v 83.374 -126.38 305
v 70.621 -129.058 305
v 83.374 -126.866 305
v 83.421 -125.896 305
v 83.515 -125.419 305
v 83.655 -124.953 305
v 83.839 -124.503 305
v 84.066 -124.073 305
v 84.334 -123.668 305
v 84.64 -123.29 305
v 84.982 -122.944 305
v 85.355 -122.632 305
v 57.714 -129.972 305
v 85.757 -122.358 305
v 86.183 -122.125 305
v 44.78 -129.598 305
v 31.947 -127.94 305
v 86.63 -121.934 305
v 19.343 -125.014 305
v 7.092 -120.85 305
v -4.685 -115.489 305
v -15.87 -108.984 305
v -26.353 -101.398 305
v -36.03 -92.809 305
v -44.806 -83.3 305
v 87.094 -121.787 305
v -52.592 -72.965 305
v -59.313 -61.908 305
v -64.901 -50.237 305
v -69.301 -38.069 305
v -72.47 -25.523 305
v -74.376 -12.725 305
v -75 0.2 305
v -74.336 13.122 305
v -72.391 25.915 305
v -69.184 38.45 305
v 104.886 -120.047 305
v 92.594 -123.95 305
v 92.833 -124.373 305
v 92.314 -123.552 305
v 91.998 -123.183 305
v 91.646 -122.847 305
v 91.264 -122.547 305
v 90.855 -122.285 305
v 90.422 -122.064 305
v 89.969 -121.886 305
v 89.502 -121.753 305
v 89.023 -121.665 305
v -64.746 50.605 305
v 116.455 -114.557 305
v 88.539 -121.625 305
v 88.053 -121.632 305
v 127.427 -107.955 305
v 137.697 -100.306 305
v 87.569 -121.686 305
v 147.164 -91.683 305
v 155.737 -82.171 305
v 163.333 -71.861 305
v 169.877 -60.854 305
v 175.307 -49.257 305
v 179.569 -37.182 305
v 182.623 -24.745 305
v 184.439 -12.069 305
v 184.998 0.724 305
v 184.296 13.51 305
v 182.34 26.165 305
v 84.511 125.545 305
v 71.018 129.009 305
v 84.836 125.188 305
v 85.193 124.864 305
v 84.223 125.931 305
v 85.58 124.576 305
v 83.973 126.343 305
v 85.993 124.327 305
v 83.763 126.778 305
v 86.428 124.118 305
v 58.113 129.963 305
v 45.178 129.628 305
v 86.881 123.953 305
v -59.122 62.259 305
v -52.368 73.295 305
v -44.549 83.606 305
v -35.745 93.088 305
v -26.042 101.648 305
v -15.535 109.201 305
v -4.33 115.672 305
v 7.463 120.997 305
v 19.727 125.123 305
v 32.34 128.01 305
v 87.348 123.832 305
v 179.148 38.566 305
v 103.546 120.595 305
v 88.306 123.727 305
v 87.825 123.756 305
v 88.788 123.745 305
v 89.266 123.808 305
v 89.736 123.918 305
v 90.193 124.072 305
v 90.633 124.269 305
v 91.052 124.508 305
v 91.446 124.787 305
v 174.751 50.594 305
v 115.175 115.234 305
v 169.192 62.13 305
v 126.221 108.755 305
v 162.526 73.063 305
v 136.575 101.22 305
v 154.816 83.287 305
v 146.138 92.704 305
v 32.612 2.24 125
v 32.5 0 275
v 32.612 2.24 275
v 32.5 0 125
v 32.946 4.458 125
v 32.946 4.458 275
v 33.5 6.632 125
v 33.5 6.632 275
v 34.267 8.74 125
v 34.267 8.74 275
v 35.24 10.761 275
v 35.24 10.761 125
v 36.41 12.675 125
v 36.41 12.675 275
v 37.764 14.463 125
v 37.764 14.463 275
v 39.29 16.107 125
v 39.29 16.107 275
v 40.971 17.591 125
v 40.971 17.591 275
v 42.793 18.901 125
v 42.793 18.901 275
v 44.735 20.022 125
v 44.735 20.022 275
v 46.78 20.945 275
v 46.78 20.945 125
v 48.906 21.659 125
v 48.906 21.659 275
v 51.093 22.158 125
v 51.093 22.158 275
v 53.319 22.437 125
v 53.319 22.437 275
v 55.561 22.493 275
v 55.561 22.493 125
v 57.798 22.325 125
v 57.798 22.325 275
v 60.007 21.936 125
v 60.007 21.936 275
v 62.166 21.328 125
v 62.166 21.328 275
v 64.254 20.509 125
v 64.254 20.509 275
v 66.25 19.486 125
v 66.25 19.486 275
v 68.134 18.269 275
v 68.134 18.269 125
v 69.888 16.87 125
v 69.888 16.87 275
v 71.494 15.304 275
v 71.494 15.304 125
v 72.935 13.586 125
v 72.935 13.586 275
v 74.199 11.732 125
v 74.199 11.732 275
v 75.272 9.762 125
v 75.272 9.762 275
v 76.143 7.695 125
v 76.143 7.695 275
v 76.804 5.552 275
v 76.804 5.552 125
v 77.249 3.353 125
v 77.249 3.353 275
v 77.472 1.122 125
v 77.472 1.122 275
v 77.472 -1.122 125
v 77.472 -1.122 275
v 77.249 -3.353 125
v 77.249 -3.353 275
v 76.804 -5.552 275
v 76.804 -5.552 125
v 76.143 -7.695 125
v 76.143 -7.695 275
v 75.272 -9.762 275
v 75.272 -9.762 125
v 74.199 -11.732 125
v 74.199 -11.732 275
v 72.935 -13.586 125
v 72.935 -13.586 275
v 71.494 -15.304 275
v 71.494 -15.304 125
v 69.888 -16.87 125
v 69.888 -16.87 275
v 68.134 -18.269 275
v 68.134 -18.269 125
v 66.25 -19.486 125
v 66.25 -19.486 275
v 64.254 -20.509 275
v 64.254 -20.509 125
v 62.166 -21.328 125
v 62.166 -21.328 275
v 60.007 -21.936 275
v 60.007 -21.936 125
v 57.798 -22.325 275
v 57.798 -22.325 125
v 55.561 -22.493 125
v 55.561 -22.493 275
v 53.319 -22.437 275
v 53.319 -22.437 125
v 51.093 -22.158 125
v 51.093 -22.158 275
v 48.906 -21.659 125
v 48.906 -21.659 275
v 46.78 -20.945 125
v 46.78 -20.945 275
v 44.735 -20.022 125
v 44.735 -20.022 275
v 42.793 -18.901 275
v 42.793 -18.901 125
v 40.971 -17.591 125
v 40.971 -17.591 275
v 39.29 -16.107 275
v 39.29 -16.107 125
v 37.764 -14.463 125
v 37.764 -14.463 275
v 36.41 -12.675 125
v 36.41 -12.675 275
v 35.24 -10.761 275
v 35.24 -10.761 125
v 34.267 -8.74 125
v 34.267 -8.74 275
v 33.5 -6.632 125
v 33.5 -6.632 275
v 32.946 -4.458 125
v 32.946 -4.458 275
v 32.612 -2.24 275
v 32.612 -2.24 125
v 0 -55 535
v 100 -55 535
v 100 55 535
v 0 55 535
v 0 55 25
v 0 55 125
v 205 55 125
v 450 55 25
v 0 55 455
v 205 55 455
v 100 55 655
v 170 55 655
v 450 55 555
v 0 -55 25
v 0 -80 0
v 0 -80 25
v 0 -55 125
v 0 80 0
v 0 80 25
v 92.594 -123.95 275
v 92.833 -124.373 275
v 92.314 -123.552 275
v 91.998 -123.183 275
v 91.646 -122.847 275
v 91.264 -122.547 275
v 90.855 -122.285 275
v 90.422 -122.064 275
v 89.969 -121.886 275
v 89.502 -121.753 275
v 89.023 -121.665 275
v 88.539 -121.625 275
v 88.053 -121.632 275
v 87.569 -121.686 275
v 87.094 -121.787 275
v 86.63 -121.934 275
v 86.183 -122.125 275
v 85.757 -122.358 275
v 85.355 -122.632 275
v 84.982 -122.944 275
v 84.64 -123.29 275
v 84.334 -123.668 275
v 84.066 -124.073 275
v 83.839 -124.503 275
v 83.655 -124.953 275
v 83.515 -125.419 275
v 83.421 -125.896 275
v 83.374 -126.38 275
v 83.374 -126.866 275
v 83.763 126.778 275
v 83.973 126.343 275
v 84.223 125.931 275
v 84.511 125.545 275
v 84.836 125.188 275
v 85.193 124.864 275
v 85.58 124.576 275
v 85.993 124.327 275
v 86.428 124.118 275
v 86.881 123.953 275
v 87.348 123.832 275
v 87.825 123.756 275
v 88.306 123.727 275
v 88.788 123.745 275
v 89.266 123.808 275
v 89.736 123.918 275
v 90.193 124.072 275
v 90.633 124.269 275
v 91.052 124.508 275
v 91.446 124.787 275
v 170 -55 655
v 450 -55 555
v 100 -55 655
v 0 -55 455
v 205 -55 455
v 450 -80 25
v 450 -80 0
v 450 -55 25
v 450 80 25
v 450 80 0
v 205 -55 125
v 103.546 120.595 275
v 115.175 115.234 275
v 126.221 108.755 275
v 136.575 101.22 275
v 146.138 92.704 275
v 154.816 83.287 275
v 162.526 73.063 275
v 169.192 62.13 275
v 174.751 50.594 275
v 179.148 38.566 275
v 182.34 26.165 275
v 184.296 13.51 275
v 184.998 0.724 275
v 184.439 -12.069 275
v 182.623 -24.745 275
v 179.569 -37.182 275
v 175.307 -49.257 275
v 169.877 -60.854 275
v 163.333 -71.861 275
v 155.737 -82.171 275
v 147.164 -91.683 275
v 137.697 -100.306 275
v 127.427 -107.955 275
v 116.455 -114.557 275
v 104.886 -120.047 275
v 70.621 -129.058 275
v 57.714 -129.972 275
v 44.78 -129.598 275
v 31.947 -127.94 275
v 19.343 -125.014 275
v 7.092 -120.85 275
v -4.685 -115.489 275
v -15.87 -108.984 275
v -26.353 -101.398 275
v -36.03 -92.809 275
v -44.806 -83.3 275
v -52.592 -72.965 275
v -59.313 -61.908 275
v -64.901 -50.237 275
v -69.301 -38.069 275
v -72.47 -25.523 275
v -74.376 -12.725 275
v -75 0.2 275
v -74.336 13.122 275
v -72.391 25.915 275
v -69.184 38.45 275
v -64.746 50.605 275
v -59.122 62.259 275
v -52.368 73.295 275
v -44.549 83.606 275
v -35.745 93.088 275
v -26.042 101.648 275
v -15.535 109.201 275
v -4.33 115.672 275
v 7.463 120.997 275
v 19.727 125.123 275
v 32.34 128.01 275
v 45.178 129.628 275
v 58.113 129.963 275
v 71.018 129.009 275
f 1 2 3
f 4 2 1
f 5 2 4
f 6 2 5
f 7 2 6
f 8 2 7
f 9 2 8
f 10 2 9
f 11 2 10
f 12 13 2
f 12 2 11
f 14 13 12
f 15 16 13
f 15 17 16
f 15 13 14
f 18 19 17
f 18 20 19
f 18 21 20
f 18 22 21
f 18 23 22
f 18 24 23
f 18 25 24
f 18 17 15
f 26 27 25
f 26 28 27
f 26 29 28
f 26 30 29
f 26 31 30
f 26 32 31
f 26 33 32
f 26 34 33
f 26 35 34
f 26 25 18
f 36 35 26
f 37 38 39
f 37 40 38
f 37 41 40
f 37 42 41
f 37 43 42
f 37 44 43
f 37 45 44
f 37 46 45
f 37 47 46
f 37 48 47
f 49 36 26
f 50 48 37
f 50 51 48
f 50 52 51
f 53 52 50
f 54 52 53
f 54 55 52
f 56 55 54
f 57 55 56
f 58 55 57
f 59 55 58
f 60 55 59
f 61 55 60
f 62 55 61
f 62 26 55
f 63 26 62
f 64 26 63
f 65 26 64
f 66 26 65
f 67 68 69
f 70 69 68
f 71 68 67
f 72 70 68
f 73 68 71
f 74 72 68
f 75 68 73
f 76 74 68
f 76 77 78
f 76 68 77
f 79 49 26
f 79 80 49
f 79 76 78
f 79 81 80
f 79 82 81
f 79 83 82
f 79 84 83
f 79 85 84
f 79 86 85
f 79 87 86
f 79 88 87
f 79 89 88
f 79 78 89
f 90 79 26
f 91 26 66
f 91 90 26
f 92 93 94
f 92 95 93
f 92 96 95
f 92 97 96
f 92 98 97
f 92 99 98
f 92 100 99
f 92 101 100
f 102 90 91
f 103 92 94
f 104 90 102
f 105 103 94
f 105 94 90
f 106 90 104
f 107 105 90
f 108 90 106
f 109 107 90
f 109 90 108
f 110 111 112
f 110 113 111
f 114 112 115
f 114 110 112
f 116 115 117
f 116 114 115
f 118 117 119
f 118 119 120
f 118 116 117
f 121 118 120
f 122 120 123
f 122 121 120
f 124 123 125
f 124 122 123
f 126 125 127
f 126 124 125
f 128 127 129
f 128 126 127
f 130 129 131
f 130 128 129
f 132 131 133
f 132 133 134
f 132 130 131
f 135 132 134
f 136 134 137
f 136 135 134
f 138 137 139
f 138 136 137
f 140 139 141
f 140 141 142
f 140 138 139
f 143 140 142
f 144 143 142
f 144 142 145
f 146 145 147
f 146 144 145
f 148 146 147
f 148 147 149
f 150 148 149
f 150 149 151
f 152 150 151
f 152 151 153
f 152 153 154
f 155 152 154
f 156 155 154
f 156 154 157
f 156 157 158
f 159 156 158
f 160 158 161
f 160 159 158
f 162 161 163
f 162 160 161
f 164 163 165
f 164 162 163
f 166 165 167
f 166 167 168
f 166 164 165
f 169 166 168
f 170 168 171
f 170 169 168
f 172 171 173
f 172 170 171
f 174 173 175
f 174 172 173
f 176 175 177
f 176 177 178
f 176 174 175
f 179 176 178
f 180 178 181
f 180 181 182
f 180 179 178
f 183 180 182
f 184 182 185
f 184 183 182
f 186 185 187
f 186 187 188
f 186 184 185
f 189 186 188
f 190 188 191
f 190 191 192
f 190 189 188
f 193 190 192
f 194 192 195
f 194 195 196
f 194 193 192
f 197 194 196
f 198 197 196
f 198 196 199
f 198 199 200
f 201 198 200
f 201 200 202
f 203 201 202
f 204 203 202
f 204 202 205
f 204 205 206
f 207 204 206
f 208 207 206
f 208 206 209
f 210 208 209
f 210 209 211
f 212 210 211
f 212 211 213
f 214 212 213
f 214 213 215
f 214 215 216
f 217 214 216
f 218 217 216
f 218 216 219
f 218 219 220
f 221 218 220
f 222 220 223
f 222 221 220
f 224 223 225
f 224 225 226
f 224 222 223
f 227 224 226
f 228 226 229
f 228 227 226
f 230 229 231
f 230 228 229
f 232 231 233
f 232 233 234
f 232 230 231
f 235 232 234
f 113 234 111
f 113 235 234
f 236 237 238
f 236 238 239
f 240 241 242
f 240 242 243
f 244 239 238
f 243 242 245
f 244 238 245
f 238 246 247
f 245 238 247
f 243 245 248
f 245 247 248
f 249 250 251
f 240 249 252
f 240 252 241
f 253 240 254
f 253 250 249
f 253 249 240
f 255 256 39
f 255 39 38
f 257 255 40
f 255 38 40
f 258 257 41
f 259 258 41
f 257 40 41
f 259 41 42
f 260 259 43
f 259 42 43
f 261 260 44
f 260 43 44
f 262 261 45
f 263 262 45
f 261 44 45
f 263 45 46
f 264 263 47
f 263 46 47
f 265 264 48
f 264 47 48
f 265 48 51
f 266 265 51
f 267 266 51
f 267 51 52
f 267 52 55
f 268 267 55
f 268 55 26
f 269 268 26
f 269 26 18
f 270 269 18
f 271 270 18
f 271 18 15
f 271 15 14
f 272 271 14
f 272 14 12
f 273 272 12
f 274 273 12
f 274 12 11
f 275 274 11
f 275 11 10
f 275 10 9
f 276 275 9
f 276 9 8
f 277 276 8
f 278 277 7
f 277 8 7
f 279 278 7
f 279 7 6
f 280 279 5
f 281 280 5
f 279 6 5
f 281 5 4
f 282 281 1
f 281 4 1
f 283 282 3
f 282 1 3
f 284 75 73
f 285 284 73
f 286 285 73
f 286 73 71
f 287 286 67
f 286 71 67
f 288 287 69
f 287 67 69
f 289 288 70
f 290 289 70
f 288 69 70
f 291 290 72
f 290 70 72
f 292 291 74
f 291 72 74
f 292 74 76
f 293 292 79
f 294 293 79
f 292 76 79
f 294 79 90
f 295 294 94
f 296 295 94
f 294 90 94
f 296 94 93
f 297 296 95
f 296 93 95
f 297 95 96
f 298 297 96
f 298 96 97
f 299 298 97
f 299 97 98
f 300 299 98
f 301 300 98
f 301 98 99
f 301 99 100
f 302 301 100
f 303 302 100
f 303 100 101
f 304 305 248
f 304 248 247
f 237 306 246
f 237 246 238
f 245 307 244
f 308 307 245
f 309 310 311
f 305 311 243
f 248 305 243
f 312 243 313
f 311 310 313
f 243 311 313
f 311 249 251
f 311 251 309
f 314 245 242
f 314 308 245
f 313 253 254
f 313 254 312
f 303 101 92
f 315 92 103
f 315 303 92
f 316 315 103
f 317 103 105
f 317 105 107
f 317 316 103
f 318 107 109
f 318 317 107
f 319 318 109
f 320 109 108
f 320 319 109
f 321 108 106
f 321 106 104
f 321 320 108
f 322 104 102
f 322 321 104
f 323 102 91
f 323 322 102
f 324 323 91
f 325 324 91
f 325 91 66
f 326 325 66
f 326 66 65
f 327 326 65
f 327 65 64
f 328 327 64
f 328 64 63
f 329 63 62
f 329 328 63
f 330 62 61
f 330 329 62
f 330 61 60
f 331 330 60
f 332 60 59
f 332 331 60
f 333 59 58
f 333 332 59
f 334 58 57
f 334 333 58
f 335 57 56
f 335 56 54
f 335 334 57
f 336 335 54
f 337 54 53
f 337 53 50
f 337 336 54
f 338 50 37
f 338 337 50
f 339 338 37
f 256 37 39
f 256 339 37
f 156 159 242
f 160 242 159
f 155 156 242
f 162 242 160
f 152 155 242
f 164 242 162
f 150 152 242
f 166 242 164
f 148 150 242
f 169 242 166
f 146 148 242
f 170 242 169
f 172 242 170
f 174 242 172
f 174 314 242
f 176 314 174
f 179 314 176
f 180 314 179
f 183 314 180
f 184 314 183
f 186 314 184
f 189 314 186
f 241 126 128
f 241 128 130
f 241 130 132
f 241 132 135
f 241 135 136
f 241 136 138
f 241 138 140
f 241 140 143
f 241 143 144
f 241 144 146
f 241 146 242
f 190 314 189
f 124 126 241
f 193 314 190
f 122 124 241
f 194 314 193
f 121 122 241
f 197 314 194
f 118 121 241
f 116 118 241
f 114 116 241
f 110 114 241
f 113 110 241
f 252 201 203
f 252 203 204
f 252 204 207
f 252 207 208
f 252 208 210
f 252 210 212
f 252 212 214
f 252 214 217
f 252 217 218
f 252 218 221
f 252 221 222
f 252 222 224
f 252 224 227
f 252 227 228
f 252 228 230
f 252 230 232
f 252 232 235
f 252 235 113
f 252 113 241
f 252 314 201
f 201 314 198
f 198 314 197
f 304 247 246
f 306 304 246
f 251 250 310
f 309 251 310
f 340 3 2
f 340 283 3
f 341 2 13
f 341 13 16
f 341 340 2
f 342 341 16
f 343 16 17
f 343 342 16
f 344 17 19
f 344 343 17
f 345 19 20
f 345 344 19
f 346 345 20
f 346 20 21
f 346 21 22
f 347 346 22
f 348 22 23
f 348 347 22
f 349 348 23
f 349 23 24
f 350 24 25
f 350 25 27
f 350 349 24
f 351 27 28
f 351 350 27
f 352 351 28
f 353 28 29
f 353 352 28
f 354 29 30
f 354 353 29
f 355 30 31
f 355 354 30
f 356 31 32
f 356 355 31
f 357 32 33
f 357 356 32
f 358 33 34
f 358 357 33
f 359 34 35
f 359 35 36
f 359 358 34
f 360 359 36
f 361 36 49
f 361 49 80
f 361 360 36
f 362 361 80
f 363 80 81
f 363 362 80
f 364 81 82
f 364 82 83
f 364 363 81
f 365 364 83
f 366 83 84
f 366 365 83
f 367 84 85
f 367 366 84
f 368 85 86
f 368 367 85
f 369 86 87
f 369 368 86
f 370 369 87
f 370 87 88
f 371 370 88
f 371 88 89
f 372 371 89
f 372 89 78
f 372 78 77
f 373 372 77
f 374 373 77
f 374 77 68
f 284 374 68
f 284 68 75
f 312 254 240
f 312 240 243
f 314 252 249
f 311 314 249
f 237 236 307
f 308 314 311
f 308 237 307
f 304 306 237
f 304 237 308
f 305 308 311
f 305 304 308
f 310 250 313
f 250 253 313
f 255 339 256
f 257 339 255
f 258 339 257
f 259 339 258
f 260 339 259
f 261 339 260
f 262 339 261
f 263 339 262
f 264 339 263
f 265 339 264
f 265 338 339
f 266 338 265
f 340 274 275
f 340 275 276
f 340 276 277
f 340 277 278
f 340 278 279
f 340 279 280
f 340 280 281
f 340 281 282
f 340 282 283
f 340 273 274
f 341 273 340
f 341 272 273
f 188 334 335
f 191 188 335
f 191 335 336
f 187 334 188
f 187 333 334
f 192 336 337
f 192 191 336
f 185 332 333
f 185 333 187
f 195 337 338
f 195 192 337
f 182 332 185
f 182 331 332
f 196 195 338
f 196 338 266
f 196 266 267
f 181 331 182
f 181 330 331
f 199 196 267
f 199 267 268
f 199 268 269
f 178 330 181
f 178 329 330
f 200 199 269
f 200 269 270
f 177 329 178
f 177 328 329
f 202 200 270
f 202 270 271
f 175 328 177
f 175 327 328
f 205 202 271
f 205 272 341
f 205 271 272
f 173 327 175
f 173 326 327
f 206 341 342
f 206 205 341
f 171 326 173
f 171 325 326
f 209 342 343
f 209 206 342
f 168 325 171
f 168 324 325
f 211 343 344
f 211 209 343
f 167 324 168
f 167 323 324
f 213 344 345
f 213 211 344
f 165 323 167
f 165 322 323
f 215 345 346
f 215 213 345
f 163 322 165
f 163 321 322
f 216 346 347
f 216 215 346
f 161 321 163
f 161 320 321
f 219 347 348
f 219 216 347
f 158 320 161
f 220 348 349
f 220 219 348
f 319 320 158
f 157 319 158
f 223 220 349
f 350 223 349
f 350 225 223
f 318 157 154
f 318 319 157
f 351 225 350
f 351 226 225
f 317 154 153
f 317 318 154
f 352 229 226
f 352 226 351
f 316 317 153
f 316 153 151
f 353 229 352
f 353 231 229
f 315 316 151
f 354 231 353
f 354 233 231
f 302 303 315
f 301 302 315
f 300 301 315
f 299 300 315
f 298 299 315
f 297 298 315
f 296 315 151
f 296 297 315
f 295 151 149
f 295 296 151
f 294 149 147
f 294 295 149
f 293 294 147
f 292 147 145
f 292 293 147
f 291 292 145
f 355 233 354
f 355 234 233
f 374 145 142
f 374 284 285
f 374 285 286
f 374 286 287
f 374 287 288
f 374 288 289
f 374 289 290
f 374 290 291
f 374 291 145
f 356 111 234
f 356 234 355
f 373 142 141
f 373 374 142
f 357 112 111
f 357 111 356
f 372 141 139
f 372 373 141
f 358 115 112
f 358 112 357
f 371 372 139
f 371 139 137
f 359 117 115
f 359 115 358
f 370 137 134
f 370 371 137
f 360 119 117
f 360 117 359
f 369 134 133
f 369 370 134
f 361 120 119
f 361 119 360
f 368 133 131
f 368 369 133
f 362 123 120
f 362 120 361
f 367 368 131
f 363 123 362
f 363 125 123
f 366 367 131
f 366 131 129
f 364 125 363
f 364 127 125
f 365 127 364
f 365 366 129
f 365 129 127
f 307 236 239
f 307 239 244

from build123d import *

# Parameters (mm, degrees)
F1_DEPTH = 55
F2_W     = 450
F2_H     = 160
F3_DEPTH = 25
F7_D     = 10


with BuildPart() as f1:
    # F0 (on Front) → F1 (new body, symmetric)
    with BuildSketch(Plane.XZ):
        Polygon((0, 125), (0, 0), (450, 0), (450, 555), (170, 655), (100, 655), (100, 535), (0, 535), (0, 455), (205, 455), (205, 125), align=None)
    extrude(amount=F1_DEPTH, both=True)

    # F2 (on Top) → F3 (join)
    with BuildSketch(Plane.XY):
        with Locations((225, 0)):
            Rectangle(F2_W, F2_H)
    extrude(amount=F3_DEPTH)

    # F4 (on Front) → F5 (revolve)
    with BuildSketch(Plane.XZ):
        Polygon((32.5, 275), (32.5, 125), (55, 125), (55, 305), (-75, 305), (-75, 275), align=None)
    revolve(axis=Axis((55, 0, 215), (0, 0, -1)))

    # F7 (through all)
    with Locations(Plane(origin=(0, 0, 0), x_dir=(1, 0, 0), z_dir=(0, 0, -1))):
        with Locations((88.3679986, 126.6223043203), (602.5738120079, 126.6223043203), (602.5738120079, -128.7268400192), (88.3679986, -128.7268400192)):
            Hole(F7_D / 2)


solid = f1.part
